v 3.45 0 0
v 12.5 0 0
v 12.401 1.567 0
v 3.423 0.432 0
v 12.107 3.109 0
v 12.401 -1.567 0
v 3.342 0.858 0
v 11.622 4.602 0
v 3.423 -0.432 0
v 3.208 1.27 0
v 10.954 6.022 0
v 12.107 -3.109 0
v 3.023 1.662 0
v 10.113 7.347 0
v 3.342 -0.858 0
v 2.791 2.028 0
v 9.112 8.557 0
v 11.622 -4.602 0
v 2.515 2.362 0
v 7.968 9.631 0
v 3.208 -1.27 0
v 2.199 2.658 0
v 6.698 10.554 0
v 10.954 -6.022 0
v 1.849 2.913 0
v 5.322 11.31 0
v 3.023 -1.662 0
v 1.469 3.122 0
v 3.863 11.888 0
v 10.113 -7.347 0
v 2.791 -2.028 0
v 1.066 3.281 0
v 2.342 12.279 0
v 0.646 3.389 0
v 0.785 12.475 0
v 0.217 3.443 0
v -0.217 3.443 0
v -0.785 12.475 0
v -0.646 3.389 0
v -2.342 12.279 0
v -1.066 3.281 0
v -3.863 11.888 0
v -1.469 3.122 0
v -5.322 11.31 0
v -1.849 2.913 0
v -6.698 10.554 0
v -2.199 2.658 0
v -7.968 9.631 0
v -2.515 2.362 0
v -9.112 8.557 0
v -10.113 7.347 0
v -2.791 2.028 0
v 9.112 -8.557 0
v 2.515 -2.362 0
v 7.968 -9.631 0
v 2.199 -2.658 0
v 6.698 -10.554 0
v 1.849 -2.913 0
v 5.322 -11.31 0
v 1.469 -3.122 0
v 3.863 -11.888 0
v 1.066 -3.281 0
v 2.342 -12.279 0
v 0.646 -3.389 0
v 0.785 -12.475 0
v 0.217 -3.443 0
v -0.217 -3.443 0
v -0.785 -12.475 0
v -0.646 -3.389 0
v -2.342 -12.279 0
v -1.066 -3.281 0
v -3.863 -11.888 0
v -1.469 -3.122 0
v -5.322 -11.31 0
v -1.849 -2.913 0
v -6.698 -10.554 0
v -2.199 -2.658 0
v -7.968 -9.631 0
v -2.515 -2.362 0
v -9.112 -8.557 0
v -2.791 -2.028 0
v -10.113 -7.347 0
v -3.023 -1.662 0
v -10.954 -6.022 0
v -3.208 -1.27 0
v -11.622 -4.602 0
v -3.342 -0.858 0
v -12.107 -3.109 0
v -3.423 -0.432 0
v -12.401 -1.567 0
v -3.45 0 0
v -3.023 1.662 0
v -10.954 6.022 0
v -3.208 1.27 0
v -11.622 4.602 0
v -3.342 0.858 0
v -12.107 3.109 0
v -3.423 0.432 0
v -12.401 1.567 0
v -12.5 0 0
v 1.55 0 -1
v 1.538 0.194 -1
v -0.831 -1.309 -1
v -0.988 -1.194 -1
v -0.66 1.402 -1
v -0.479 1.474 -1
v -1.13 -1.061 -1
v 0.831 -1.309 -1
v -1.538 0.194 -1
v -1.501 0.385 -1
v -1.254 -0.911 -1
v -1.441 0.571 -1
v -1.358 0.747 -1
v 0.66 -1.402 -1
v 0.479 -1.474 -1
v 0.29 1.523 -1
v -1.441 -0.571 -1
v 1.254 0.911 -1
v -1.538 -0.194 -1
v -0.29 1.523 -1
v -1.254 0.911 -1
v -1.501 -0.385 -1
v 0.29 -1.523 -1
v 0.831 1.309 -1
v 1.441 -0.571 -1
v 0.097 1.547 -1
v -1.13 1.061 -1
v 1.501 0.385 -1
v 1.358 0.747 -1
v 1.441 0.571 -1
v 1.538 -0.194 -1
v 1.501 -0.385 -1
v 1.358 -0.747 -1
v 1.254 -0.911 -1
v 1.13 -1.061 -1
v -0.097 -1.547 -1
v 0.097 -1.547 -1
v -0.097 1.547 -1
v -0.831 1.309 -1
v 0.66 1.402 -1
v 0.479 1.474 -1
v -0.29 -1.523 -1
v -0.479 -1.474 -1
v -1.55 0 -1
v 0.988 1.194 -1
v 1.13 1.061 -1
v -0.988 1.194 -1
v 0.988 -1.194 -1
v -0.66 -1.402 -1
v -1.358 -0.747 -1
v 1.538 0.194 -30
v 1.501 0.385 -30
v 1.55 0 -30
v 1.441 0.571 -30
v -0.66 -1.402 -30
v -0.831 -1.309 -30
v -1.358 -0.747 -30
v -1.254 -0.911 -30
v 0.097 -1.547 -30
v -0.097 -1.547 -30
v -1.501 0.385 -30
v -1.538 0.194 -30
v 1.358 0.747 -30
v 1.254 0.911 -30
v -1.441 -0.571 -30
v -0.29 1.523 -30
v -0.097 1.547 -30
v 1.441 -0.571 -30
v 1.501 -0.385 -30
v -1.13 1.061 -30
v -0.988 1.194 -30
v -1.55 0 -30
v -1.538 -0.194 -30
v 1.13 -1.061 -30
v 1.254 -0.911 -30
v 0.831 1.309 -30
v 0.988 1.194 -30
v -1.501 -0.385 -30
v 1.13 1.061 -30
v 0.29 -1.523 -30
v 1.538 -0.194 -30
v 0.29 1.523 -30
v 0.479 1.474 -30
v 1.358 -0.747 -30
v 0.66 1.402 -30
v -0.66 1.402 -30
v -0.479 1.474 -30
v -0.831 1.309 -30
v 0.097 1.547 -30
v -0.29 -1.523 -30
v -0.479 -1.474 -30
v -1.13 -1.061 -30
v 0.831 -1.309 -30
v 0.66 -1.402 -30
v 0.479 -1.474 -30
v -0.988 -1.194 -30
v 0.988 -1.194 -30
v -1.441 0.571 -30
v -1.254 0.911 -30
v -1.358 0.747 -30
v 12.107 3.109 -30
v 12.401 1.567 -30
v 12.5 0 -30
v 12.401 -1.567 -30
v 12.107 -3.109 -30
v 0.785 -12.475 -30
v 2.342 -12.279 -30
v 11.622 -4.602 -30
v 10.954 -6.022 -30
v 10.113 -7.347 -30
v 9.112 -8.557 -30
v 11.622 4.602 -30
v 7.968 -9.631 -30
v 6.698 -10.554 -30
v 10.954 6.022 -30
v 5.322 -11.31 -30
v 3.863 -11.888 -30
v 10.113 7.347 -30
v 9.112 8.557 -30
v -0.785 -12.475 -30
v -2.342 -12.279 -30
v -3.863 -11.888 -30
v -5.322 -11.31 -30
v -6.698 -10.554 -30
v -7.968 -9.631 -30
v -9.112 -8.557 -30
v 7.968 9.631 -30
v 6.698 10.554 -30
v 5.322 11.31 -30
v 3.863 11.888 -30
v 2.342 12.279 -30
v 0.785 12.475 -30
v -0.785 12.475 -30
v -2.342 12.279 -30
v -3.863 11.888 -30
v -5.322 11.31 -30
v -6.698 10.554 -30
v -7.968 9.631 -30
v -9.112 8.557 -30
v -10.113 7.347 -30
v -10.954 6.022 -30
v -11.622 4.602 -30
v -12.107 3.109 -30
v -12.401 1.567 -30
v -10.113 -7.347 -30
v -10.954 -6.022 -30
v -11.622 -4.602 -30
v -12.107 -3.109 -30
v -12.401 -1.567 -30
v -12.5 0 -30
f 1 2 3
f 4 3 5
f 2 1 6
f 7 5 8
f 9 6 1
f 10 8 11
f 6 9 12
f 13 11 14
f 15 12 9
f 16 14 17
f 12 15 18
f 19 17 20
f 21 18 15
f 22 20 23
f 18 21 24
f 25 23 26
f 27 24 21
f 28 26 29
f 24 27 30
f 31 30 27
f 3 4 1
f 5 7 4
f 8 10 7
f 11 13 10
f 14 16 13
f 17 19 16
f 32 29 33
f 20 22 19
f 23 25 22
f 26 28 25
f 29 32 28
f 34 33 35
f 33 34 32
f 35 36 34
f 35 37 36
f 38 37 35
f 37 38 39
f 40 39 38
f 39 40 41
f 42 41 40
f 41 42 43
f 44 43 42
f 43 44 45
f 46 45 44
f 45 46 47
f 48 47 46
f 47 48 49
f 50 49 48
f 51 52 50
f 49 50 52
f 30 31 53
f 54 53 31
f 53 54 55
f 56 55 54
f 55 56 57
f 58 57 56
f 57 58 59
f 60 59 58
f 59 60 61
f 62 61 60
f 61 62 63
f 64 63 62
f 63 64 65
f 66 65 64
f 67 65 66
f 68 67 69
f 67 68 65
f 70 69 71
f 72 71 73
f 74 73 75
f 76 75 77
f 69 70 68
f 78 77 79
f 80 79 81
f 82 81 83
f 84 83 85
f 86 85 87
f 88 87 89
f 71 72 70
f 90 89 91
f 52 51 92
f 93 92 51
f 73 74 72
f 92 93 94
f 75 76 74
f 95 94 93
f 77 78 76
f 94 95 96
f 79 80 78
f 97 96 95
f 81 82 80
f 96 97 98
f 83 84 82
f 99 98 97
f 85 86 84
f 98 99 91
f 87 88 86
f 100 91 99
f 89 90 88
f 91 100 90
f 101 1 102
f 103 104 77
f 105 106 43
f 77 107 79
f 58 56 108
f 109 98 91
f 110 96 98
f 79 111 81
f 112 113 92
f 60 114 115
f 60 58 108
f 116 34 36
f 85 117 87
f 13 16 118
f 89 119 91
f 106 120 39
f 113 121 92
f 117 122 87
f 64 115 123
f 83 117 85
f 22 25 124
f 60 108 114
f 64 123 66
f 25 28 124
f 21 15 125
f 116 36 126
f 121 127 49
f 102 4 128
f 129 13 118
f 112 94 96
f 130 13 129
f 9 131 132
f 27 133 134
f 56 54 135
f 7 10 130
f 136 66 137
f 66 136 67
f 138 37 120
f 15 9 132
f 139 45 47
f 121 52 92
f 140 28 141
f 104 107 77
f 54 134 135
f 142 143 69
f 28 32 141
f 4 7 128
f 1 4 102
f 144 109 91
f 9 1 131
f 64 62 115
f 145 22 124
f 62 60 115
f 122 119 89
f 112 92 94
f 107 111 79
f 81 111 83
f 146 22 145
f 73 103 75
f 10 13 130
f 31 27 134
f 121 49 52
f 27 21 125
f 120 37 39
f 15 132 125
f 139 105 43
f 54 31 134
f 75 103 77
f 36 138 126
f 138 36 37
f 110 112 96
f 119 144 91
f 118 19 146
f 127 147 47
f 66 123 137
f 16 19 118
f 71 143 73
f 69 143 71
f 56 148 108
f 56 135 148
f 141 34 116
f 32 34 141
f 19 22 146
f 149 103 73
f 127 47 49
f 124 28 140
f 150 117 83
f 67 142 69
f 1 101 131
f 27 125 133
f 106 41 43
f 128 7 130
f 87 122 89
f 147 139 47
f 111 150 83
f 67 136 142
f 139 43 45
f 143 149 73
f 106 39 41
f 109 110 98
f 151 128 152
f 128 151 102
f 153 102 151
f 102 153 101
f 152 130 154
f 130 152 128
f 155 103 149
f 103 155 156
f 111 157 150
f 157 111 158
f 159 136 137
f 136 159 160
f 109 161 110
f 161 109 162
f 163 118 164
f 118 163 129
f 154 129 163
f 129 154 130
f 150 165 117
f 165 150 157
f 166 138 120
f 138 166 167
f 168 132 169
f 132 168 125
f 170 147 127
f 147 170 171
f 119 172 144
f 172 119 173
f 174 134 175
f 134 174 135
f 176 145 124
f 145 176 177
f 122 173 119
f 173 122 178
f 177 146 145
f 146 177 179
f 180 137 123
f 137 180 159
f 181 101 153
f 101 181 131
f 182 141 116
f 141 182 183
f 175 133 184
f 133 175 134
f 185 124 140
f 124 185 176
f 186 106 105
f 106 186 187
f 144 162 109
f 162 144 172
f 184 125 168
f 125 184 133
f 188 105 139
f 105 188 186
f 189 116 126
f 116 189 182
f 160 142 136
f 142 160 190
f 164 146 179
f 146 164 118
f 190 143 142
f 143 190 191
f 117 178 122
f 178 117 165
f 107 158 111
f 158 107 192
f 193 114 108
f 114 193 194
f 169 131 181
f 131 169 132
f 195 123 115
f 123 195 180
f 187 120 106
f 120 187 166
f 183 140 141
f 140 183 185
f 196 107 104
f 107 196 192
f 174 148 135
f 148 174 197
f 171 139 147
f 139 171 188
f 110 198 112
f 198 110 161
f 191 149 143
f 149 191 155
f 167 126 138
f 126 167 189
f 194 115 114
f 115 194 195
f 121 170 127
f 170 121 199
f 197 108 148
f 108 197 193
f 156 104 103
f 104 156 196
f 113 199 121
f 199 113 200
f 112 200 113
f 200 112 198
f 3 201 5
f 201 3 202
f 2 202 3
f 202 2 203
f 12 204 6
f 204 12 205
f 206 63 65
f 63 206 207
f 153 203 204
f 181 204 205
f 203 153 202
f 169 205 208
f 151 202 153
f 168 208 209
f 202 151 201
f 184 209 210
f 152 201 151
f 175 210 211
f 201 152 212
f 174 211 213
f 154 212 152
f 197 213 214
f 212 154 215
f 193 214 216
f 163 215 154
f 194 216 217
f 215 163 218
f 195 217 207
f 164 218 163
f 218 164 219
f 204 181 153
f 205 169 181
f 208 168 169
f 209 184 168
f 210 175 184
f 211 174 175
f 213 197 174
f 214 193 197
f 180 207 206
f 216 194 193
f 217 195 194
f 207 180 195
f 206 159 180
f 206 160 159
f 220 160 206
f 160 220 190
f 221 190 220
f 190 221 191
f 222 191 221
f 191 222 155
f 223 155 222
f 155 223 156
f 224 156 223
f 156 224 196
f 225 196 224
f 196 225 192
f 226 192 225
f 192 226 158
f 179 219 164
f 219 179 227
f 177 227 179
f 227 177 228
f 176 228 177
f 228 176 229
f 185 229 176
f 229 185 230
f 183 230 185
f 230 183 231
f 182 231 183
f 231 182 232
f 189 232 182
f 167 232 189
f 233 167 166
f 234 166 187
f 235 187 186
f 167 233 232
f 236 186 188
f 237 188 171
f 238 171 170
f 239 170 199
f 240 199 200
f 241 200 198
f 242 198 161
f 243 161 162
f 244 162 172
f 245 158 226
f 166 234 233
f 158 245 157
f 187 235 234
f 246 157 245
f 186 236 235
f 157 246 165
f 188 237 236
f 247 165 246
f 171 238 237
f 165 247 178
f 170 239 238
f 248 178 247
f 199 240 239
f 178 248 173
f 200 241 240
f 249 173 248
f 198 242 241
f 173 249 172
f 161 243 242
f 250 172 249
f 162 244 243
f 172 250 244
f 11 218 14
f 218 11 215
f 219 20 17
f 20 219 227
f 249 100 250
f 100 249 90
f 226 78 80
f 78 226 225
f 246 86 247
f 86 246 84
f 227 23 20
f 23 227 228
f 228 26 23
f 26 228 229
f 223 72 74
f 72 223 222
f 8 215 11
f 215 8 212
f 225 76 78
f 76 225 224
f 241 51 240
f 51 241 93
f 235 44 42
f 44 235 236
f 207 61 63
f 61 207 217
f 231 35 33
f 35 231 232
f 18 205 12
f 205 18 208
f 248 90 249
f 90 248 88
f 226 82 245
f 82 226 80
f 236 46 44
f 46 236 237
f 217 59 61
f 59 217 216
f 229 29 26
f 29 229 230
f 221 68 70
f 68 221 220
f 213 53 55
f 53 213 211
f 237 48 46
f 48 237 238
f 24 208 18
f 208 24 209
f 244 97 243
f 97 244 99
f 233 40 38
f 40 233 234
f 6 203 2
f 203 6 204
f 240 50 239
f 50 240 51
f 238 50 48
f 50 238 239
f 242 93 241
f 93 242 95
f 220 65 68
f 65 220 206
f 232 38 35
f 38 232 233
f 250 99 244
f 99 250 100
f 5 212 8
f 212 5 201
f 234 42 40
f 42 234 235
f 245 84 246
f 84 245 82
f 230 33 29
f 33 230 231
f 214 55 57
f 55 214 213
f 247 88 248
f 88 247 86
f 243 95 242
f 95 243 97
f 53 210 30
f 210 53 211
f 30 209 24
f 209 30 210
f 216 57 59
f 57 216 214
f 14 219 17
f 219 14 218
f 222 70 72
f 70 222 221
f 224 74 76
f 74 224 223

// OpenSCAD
$fn = 50;


difference() {
	union() {
		translate(v = [0, 0, -30.0000000000]) {
			cylinder(h = 30, r = 12.5000000000);
		}
	}
	union() {
		translate(v = [0, 0, 0]) {
			rotate(a = [0, 0, 0]) {
				difference() {
					union() {
						translate(v = [0, 0, -33.0000000000]) {
							cylinder(h = 33, r = 1.2500000000);
						}
						translate(v = [0, 0, -1.0000000000]) {
							cylinder(h = 1.0000000000, r1 = 1.5500000000, r2 = 3.4500000000);
						}
						translate(v = [0, 0, -33.0000000000]) {
							cylinder(h = 33, r = 1.5500000000);
						}
						translate(v = [0, 0, -33.0000000000]) {
							cylinder(h = 33, r = 1.2500000000);
						}
					}
					union();
				}
			}
		}
	}
}
